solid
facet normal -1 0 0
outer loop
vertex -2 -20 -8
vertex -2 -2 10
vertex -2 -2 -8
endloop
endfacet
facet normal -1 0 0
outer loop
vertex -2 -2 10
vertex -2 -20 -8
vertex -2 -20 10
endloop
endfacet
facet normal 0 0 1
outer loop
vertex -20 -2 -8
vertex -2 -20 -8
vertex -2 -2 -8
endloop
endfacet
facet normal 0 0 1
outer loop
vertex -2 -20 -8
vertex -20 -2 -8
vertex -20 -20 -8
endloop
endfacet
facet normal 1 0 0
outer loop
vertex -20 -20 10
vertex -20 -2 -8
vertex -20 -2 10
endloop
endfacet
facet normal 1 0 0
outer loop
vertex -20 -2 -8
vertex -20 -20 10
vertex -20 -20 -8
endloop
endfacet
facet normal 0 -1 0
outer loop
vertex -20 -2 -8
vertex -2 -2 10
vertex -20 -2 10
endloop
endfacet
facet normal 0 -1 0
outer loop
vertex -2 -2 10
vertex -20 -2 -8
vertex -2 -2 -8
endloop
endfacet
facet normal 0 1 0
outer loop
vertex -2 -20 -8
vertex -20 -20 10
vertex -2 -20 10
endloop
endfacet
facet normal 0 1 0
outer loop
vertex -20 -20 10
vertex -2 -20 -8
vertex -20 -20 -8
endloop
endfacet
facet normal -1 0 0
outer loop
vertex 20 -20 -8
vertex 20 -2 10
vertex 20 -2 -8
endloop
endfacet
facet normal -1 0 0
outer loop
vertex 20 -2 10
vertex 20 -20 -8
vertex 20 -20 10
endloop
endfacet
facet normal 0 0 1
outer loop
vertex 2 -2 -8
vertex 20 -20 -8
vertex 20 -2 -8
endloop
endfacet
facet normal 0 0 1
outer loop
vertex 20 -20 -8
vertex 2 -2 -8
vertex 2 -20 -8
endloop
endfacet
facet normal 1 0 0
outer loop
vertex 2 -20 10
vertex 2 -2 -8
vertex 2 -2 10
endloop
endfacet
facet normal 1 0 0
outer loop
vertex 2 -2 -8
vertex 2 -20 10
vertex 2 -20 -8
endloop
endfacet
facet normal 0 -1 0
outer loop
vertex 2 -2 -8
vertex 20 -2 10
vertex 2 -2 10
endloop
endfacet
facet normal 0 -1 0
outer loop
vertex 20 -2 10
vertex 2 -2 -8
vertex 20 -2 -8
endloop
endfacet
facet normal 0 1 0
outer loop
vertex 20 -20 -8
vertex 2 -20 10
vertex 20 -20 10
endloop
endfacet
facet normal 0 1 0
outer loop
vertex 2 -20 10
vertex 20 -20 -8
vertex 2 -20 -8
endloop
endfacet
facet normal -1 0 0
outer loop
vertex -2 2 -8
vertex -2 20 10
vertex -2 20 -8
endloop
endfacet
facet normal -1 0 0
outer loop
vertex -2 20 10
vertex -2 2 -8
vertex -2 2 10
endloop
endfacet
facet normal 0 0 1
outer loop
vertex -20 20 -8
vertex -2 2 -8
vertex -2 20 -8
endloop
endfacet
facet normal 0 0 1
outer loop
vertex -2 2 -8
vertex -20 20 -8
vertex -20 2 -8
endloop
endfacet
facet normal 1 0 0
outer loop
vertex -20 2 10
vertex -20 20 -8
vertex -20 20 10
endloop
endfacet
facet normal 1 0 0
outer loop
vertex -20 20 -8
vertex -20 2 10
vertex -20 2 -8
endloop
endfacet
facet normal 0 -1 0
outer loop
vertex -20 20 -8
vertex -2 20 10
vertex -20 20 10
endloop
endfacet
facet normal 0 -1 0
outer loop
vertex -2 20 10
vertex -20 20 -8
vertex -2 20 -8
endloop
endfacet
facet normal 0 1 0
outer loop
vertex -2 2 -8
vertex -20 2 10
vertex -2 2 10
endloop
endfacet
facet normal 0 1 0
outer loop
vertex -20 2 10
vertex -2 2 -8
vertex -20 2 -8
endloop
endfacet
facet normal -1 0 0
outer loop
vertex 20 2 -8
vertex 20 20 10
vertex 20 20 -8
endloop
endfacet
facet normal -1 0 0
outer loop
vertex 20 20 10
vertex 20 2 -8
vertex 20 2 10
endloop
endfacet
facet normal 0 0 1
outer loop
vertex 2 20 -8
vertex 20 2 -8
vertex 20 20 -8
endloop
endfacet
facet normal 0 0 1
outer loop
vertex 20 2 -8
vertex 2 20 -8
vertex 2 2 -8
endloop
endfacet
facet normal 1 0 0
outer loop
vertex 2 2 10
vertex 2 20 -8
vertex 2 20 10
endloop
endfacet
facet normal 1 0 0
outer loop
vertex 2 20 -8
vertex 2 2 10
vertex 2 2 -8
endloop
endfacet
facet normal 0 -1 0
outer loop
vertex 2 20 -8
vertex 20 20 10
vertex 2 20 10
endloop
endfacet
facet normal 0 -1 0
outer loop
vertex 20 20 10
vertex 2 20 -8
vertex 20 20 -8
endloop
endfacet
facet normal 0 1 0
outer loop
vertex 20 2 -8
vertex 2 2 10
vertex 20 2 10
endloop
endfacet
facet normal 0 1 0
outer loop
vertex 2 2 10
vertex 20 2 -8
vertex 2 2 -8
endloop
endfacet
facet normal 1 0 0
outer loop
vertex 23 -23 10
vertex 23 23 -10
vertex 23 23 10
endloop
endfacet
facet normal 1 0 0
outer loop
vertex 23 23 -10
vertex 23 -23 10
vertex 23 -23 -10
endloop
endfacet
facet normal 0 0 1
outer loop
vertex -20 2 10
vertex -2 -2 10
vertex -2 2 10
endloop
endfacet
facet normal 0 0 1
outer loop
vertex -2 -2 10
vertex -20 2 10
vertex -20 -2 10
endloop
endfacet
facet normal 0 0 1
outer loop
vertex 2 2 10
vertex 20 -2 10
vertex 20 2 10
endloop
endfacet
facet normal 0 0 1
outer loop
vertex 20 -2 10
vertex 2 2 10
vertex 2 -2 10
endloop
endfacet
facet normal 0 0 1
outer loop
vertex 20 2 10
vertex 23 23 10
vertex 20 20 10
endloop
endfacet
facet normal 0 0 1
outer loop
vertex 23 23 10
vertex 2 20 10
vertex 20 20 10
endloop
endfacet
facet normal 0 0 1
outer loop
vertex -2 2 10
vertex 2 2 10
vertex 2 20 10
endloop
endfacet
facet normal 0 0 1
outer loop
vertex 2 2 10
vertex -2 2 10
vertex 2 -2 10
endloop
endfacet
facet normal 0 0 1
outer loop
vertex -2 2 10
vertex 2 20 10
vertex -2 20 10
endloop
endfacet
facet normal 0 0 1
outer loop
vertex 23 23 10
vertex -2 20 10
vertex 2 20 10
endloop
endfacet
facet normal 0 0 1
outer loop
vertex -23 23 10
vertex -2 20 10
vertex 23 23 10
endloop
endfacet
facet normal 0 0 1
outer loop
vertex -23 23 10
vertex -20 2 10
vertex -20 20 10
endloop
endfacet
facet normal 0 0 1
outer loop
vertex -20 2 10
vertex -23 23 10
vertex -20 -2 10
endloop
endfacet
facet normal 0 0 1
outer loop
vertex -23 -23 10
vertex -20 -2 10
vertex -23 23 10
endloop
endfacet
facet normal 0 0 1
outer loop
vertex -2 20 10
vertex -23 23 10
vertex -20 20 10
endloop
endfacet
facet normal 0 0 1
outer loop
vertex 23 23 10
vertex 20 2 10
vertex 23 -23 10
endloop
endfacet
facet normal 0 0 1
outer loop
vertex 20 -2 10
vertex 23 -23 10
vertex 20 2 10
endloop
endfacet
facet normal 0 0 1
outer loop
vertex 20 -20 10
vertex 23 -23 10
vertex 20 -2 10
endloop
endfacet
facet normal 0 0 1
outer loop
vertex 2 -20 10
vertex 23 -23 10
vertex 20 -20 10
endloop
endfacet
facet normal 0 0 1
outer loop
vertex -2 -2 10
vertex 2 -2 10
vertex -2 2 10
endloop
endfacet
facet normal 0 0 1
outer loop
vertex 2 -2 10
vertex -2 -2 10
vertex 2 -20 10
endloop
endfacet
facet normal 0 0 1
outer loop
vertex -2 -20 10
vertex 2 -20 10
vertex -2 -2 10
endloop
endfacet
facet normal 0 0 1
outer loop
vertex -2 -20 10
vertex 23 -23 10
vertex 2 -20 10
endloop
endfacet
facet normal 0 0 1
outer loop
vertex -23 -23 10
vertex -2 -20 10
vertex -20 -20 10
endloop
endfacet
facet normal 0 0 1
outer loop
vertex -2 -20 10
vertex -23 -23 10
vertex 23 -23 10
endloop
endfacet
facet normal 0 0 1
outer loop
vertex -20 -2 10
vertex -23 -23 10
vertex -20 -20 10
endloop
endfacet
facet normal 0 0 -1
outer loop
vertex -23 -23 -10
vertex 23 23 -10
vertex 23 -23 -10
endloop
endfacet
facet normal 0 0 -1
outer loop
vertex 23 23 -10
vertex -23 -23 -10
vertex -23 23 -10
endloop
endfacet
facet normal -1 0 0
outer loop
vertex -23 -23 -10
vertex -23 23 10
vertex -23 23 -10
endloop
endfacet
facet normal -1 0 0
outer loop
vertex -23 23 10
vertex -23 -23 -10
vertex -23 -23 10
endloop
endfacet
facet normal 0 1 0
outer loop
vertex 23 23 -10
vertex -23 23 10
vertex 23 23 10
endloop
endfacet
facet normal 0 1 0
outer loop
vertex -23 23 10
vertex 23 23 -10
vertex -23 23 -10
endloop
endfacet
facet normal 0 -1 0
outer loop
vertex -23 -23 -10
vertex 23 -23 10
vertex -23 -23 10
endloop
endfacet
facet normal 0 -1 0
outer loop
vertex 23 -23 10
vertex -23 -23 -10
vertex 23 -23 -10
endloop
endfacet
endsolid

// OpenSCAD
$fn = 32;

// ----------------------------------------------------------------------
// Pocket plate 46 x 46 x 20
// 2 x 2 pockets 18 mm square, 18 mm deep
// ----------------------------------------------------------------------

// --- parameters (mm) ---
thickness = 20;  // plate thickness
floor_t = 2;     // material left under each pocket
pocket = 18;     // pocket side length
pitch_x = 22;    // pocket pitch along X
pitch_y = 22;    // pocket pitch along Y
cols = 2;        // pockets per row
rows = 2;        // rows of pockets

// --- derived feature positions (mm) ---
depth = thickness - floor_t;        // = 18   pocket depth, down to the floor
span_x = (cols - 1) * pitch_x;      // = 22   distance between outer pockets
span_y = (rows - 1) * pitch_y;      // = 22   distance between outer pocket rows
origin_x = -span_x / 2;             // = -11   X of the first pocket
origin_y = -span_y / 2;             // = -11   Y of the first pocket
plate = [span_x + pocket + 6, span_y + pocket + 6, thickness];  // = [46, 46, 20]   overall size: pockets plus 3 mm of wall on each side
feature_centers = [
  [origin_x + 0 * pitch_x, origin_y + 0 * pitch_y],
  [origin_x + 1 * pitch_x, origin_y + 0 * pitch_y],
  [origin_x + 0 * pitch_x, origin_y + 1 * pitch_y],
  [origin_x + 1 * pitch_x, origin_y + 1 * pitch_y]
];   // pocket centres, used verbatim by the cutter loop

// plate outline, then one pocket per centre in feature_centers
difference() {
  cube(plate, center = true);
  for (centre = feature_centers)
    translate([centre[0] - pocket / 2, centre[1] - pocket / 2, plate[2] / 2 - depth])
      cube([pocket, pocket, depth + 1]);  // centred on the declared pocket centre
}
